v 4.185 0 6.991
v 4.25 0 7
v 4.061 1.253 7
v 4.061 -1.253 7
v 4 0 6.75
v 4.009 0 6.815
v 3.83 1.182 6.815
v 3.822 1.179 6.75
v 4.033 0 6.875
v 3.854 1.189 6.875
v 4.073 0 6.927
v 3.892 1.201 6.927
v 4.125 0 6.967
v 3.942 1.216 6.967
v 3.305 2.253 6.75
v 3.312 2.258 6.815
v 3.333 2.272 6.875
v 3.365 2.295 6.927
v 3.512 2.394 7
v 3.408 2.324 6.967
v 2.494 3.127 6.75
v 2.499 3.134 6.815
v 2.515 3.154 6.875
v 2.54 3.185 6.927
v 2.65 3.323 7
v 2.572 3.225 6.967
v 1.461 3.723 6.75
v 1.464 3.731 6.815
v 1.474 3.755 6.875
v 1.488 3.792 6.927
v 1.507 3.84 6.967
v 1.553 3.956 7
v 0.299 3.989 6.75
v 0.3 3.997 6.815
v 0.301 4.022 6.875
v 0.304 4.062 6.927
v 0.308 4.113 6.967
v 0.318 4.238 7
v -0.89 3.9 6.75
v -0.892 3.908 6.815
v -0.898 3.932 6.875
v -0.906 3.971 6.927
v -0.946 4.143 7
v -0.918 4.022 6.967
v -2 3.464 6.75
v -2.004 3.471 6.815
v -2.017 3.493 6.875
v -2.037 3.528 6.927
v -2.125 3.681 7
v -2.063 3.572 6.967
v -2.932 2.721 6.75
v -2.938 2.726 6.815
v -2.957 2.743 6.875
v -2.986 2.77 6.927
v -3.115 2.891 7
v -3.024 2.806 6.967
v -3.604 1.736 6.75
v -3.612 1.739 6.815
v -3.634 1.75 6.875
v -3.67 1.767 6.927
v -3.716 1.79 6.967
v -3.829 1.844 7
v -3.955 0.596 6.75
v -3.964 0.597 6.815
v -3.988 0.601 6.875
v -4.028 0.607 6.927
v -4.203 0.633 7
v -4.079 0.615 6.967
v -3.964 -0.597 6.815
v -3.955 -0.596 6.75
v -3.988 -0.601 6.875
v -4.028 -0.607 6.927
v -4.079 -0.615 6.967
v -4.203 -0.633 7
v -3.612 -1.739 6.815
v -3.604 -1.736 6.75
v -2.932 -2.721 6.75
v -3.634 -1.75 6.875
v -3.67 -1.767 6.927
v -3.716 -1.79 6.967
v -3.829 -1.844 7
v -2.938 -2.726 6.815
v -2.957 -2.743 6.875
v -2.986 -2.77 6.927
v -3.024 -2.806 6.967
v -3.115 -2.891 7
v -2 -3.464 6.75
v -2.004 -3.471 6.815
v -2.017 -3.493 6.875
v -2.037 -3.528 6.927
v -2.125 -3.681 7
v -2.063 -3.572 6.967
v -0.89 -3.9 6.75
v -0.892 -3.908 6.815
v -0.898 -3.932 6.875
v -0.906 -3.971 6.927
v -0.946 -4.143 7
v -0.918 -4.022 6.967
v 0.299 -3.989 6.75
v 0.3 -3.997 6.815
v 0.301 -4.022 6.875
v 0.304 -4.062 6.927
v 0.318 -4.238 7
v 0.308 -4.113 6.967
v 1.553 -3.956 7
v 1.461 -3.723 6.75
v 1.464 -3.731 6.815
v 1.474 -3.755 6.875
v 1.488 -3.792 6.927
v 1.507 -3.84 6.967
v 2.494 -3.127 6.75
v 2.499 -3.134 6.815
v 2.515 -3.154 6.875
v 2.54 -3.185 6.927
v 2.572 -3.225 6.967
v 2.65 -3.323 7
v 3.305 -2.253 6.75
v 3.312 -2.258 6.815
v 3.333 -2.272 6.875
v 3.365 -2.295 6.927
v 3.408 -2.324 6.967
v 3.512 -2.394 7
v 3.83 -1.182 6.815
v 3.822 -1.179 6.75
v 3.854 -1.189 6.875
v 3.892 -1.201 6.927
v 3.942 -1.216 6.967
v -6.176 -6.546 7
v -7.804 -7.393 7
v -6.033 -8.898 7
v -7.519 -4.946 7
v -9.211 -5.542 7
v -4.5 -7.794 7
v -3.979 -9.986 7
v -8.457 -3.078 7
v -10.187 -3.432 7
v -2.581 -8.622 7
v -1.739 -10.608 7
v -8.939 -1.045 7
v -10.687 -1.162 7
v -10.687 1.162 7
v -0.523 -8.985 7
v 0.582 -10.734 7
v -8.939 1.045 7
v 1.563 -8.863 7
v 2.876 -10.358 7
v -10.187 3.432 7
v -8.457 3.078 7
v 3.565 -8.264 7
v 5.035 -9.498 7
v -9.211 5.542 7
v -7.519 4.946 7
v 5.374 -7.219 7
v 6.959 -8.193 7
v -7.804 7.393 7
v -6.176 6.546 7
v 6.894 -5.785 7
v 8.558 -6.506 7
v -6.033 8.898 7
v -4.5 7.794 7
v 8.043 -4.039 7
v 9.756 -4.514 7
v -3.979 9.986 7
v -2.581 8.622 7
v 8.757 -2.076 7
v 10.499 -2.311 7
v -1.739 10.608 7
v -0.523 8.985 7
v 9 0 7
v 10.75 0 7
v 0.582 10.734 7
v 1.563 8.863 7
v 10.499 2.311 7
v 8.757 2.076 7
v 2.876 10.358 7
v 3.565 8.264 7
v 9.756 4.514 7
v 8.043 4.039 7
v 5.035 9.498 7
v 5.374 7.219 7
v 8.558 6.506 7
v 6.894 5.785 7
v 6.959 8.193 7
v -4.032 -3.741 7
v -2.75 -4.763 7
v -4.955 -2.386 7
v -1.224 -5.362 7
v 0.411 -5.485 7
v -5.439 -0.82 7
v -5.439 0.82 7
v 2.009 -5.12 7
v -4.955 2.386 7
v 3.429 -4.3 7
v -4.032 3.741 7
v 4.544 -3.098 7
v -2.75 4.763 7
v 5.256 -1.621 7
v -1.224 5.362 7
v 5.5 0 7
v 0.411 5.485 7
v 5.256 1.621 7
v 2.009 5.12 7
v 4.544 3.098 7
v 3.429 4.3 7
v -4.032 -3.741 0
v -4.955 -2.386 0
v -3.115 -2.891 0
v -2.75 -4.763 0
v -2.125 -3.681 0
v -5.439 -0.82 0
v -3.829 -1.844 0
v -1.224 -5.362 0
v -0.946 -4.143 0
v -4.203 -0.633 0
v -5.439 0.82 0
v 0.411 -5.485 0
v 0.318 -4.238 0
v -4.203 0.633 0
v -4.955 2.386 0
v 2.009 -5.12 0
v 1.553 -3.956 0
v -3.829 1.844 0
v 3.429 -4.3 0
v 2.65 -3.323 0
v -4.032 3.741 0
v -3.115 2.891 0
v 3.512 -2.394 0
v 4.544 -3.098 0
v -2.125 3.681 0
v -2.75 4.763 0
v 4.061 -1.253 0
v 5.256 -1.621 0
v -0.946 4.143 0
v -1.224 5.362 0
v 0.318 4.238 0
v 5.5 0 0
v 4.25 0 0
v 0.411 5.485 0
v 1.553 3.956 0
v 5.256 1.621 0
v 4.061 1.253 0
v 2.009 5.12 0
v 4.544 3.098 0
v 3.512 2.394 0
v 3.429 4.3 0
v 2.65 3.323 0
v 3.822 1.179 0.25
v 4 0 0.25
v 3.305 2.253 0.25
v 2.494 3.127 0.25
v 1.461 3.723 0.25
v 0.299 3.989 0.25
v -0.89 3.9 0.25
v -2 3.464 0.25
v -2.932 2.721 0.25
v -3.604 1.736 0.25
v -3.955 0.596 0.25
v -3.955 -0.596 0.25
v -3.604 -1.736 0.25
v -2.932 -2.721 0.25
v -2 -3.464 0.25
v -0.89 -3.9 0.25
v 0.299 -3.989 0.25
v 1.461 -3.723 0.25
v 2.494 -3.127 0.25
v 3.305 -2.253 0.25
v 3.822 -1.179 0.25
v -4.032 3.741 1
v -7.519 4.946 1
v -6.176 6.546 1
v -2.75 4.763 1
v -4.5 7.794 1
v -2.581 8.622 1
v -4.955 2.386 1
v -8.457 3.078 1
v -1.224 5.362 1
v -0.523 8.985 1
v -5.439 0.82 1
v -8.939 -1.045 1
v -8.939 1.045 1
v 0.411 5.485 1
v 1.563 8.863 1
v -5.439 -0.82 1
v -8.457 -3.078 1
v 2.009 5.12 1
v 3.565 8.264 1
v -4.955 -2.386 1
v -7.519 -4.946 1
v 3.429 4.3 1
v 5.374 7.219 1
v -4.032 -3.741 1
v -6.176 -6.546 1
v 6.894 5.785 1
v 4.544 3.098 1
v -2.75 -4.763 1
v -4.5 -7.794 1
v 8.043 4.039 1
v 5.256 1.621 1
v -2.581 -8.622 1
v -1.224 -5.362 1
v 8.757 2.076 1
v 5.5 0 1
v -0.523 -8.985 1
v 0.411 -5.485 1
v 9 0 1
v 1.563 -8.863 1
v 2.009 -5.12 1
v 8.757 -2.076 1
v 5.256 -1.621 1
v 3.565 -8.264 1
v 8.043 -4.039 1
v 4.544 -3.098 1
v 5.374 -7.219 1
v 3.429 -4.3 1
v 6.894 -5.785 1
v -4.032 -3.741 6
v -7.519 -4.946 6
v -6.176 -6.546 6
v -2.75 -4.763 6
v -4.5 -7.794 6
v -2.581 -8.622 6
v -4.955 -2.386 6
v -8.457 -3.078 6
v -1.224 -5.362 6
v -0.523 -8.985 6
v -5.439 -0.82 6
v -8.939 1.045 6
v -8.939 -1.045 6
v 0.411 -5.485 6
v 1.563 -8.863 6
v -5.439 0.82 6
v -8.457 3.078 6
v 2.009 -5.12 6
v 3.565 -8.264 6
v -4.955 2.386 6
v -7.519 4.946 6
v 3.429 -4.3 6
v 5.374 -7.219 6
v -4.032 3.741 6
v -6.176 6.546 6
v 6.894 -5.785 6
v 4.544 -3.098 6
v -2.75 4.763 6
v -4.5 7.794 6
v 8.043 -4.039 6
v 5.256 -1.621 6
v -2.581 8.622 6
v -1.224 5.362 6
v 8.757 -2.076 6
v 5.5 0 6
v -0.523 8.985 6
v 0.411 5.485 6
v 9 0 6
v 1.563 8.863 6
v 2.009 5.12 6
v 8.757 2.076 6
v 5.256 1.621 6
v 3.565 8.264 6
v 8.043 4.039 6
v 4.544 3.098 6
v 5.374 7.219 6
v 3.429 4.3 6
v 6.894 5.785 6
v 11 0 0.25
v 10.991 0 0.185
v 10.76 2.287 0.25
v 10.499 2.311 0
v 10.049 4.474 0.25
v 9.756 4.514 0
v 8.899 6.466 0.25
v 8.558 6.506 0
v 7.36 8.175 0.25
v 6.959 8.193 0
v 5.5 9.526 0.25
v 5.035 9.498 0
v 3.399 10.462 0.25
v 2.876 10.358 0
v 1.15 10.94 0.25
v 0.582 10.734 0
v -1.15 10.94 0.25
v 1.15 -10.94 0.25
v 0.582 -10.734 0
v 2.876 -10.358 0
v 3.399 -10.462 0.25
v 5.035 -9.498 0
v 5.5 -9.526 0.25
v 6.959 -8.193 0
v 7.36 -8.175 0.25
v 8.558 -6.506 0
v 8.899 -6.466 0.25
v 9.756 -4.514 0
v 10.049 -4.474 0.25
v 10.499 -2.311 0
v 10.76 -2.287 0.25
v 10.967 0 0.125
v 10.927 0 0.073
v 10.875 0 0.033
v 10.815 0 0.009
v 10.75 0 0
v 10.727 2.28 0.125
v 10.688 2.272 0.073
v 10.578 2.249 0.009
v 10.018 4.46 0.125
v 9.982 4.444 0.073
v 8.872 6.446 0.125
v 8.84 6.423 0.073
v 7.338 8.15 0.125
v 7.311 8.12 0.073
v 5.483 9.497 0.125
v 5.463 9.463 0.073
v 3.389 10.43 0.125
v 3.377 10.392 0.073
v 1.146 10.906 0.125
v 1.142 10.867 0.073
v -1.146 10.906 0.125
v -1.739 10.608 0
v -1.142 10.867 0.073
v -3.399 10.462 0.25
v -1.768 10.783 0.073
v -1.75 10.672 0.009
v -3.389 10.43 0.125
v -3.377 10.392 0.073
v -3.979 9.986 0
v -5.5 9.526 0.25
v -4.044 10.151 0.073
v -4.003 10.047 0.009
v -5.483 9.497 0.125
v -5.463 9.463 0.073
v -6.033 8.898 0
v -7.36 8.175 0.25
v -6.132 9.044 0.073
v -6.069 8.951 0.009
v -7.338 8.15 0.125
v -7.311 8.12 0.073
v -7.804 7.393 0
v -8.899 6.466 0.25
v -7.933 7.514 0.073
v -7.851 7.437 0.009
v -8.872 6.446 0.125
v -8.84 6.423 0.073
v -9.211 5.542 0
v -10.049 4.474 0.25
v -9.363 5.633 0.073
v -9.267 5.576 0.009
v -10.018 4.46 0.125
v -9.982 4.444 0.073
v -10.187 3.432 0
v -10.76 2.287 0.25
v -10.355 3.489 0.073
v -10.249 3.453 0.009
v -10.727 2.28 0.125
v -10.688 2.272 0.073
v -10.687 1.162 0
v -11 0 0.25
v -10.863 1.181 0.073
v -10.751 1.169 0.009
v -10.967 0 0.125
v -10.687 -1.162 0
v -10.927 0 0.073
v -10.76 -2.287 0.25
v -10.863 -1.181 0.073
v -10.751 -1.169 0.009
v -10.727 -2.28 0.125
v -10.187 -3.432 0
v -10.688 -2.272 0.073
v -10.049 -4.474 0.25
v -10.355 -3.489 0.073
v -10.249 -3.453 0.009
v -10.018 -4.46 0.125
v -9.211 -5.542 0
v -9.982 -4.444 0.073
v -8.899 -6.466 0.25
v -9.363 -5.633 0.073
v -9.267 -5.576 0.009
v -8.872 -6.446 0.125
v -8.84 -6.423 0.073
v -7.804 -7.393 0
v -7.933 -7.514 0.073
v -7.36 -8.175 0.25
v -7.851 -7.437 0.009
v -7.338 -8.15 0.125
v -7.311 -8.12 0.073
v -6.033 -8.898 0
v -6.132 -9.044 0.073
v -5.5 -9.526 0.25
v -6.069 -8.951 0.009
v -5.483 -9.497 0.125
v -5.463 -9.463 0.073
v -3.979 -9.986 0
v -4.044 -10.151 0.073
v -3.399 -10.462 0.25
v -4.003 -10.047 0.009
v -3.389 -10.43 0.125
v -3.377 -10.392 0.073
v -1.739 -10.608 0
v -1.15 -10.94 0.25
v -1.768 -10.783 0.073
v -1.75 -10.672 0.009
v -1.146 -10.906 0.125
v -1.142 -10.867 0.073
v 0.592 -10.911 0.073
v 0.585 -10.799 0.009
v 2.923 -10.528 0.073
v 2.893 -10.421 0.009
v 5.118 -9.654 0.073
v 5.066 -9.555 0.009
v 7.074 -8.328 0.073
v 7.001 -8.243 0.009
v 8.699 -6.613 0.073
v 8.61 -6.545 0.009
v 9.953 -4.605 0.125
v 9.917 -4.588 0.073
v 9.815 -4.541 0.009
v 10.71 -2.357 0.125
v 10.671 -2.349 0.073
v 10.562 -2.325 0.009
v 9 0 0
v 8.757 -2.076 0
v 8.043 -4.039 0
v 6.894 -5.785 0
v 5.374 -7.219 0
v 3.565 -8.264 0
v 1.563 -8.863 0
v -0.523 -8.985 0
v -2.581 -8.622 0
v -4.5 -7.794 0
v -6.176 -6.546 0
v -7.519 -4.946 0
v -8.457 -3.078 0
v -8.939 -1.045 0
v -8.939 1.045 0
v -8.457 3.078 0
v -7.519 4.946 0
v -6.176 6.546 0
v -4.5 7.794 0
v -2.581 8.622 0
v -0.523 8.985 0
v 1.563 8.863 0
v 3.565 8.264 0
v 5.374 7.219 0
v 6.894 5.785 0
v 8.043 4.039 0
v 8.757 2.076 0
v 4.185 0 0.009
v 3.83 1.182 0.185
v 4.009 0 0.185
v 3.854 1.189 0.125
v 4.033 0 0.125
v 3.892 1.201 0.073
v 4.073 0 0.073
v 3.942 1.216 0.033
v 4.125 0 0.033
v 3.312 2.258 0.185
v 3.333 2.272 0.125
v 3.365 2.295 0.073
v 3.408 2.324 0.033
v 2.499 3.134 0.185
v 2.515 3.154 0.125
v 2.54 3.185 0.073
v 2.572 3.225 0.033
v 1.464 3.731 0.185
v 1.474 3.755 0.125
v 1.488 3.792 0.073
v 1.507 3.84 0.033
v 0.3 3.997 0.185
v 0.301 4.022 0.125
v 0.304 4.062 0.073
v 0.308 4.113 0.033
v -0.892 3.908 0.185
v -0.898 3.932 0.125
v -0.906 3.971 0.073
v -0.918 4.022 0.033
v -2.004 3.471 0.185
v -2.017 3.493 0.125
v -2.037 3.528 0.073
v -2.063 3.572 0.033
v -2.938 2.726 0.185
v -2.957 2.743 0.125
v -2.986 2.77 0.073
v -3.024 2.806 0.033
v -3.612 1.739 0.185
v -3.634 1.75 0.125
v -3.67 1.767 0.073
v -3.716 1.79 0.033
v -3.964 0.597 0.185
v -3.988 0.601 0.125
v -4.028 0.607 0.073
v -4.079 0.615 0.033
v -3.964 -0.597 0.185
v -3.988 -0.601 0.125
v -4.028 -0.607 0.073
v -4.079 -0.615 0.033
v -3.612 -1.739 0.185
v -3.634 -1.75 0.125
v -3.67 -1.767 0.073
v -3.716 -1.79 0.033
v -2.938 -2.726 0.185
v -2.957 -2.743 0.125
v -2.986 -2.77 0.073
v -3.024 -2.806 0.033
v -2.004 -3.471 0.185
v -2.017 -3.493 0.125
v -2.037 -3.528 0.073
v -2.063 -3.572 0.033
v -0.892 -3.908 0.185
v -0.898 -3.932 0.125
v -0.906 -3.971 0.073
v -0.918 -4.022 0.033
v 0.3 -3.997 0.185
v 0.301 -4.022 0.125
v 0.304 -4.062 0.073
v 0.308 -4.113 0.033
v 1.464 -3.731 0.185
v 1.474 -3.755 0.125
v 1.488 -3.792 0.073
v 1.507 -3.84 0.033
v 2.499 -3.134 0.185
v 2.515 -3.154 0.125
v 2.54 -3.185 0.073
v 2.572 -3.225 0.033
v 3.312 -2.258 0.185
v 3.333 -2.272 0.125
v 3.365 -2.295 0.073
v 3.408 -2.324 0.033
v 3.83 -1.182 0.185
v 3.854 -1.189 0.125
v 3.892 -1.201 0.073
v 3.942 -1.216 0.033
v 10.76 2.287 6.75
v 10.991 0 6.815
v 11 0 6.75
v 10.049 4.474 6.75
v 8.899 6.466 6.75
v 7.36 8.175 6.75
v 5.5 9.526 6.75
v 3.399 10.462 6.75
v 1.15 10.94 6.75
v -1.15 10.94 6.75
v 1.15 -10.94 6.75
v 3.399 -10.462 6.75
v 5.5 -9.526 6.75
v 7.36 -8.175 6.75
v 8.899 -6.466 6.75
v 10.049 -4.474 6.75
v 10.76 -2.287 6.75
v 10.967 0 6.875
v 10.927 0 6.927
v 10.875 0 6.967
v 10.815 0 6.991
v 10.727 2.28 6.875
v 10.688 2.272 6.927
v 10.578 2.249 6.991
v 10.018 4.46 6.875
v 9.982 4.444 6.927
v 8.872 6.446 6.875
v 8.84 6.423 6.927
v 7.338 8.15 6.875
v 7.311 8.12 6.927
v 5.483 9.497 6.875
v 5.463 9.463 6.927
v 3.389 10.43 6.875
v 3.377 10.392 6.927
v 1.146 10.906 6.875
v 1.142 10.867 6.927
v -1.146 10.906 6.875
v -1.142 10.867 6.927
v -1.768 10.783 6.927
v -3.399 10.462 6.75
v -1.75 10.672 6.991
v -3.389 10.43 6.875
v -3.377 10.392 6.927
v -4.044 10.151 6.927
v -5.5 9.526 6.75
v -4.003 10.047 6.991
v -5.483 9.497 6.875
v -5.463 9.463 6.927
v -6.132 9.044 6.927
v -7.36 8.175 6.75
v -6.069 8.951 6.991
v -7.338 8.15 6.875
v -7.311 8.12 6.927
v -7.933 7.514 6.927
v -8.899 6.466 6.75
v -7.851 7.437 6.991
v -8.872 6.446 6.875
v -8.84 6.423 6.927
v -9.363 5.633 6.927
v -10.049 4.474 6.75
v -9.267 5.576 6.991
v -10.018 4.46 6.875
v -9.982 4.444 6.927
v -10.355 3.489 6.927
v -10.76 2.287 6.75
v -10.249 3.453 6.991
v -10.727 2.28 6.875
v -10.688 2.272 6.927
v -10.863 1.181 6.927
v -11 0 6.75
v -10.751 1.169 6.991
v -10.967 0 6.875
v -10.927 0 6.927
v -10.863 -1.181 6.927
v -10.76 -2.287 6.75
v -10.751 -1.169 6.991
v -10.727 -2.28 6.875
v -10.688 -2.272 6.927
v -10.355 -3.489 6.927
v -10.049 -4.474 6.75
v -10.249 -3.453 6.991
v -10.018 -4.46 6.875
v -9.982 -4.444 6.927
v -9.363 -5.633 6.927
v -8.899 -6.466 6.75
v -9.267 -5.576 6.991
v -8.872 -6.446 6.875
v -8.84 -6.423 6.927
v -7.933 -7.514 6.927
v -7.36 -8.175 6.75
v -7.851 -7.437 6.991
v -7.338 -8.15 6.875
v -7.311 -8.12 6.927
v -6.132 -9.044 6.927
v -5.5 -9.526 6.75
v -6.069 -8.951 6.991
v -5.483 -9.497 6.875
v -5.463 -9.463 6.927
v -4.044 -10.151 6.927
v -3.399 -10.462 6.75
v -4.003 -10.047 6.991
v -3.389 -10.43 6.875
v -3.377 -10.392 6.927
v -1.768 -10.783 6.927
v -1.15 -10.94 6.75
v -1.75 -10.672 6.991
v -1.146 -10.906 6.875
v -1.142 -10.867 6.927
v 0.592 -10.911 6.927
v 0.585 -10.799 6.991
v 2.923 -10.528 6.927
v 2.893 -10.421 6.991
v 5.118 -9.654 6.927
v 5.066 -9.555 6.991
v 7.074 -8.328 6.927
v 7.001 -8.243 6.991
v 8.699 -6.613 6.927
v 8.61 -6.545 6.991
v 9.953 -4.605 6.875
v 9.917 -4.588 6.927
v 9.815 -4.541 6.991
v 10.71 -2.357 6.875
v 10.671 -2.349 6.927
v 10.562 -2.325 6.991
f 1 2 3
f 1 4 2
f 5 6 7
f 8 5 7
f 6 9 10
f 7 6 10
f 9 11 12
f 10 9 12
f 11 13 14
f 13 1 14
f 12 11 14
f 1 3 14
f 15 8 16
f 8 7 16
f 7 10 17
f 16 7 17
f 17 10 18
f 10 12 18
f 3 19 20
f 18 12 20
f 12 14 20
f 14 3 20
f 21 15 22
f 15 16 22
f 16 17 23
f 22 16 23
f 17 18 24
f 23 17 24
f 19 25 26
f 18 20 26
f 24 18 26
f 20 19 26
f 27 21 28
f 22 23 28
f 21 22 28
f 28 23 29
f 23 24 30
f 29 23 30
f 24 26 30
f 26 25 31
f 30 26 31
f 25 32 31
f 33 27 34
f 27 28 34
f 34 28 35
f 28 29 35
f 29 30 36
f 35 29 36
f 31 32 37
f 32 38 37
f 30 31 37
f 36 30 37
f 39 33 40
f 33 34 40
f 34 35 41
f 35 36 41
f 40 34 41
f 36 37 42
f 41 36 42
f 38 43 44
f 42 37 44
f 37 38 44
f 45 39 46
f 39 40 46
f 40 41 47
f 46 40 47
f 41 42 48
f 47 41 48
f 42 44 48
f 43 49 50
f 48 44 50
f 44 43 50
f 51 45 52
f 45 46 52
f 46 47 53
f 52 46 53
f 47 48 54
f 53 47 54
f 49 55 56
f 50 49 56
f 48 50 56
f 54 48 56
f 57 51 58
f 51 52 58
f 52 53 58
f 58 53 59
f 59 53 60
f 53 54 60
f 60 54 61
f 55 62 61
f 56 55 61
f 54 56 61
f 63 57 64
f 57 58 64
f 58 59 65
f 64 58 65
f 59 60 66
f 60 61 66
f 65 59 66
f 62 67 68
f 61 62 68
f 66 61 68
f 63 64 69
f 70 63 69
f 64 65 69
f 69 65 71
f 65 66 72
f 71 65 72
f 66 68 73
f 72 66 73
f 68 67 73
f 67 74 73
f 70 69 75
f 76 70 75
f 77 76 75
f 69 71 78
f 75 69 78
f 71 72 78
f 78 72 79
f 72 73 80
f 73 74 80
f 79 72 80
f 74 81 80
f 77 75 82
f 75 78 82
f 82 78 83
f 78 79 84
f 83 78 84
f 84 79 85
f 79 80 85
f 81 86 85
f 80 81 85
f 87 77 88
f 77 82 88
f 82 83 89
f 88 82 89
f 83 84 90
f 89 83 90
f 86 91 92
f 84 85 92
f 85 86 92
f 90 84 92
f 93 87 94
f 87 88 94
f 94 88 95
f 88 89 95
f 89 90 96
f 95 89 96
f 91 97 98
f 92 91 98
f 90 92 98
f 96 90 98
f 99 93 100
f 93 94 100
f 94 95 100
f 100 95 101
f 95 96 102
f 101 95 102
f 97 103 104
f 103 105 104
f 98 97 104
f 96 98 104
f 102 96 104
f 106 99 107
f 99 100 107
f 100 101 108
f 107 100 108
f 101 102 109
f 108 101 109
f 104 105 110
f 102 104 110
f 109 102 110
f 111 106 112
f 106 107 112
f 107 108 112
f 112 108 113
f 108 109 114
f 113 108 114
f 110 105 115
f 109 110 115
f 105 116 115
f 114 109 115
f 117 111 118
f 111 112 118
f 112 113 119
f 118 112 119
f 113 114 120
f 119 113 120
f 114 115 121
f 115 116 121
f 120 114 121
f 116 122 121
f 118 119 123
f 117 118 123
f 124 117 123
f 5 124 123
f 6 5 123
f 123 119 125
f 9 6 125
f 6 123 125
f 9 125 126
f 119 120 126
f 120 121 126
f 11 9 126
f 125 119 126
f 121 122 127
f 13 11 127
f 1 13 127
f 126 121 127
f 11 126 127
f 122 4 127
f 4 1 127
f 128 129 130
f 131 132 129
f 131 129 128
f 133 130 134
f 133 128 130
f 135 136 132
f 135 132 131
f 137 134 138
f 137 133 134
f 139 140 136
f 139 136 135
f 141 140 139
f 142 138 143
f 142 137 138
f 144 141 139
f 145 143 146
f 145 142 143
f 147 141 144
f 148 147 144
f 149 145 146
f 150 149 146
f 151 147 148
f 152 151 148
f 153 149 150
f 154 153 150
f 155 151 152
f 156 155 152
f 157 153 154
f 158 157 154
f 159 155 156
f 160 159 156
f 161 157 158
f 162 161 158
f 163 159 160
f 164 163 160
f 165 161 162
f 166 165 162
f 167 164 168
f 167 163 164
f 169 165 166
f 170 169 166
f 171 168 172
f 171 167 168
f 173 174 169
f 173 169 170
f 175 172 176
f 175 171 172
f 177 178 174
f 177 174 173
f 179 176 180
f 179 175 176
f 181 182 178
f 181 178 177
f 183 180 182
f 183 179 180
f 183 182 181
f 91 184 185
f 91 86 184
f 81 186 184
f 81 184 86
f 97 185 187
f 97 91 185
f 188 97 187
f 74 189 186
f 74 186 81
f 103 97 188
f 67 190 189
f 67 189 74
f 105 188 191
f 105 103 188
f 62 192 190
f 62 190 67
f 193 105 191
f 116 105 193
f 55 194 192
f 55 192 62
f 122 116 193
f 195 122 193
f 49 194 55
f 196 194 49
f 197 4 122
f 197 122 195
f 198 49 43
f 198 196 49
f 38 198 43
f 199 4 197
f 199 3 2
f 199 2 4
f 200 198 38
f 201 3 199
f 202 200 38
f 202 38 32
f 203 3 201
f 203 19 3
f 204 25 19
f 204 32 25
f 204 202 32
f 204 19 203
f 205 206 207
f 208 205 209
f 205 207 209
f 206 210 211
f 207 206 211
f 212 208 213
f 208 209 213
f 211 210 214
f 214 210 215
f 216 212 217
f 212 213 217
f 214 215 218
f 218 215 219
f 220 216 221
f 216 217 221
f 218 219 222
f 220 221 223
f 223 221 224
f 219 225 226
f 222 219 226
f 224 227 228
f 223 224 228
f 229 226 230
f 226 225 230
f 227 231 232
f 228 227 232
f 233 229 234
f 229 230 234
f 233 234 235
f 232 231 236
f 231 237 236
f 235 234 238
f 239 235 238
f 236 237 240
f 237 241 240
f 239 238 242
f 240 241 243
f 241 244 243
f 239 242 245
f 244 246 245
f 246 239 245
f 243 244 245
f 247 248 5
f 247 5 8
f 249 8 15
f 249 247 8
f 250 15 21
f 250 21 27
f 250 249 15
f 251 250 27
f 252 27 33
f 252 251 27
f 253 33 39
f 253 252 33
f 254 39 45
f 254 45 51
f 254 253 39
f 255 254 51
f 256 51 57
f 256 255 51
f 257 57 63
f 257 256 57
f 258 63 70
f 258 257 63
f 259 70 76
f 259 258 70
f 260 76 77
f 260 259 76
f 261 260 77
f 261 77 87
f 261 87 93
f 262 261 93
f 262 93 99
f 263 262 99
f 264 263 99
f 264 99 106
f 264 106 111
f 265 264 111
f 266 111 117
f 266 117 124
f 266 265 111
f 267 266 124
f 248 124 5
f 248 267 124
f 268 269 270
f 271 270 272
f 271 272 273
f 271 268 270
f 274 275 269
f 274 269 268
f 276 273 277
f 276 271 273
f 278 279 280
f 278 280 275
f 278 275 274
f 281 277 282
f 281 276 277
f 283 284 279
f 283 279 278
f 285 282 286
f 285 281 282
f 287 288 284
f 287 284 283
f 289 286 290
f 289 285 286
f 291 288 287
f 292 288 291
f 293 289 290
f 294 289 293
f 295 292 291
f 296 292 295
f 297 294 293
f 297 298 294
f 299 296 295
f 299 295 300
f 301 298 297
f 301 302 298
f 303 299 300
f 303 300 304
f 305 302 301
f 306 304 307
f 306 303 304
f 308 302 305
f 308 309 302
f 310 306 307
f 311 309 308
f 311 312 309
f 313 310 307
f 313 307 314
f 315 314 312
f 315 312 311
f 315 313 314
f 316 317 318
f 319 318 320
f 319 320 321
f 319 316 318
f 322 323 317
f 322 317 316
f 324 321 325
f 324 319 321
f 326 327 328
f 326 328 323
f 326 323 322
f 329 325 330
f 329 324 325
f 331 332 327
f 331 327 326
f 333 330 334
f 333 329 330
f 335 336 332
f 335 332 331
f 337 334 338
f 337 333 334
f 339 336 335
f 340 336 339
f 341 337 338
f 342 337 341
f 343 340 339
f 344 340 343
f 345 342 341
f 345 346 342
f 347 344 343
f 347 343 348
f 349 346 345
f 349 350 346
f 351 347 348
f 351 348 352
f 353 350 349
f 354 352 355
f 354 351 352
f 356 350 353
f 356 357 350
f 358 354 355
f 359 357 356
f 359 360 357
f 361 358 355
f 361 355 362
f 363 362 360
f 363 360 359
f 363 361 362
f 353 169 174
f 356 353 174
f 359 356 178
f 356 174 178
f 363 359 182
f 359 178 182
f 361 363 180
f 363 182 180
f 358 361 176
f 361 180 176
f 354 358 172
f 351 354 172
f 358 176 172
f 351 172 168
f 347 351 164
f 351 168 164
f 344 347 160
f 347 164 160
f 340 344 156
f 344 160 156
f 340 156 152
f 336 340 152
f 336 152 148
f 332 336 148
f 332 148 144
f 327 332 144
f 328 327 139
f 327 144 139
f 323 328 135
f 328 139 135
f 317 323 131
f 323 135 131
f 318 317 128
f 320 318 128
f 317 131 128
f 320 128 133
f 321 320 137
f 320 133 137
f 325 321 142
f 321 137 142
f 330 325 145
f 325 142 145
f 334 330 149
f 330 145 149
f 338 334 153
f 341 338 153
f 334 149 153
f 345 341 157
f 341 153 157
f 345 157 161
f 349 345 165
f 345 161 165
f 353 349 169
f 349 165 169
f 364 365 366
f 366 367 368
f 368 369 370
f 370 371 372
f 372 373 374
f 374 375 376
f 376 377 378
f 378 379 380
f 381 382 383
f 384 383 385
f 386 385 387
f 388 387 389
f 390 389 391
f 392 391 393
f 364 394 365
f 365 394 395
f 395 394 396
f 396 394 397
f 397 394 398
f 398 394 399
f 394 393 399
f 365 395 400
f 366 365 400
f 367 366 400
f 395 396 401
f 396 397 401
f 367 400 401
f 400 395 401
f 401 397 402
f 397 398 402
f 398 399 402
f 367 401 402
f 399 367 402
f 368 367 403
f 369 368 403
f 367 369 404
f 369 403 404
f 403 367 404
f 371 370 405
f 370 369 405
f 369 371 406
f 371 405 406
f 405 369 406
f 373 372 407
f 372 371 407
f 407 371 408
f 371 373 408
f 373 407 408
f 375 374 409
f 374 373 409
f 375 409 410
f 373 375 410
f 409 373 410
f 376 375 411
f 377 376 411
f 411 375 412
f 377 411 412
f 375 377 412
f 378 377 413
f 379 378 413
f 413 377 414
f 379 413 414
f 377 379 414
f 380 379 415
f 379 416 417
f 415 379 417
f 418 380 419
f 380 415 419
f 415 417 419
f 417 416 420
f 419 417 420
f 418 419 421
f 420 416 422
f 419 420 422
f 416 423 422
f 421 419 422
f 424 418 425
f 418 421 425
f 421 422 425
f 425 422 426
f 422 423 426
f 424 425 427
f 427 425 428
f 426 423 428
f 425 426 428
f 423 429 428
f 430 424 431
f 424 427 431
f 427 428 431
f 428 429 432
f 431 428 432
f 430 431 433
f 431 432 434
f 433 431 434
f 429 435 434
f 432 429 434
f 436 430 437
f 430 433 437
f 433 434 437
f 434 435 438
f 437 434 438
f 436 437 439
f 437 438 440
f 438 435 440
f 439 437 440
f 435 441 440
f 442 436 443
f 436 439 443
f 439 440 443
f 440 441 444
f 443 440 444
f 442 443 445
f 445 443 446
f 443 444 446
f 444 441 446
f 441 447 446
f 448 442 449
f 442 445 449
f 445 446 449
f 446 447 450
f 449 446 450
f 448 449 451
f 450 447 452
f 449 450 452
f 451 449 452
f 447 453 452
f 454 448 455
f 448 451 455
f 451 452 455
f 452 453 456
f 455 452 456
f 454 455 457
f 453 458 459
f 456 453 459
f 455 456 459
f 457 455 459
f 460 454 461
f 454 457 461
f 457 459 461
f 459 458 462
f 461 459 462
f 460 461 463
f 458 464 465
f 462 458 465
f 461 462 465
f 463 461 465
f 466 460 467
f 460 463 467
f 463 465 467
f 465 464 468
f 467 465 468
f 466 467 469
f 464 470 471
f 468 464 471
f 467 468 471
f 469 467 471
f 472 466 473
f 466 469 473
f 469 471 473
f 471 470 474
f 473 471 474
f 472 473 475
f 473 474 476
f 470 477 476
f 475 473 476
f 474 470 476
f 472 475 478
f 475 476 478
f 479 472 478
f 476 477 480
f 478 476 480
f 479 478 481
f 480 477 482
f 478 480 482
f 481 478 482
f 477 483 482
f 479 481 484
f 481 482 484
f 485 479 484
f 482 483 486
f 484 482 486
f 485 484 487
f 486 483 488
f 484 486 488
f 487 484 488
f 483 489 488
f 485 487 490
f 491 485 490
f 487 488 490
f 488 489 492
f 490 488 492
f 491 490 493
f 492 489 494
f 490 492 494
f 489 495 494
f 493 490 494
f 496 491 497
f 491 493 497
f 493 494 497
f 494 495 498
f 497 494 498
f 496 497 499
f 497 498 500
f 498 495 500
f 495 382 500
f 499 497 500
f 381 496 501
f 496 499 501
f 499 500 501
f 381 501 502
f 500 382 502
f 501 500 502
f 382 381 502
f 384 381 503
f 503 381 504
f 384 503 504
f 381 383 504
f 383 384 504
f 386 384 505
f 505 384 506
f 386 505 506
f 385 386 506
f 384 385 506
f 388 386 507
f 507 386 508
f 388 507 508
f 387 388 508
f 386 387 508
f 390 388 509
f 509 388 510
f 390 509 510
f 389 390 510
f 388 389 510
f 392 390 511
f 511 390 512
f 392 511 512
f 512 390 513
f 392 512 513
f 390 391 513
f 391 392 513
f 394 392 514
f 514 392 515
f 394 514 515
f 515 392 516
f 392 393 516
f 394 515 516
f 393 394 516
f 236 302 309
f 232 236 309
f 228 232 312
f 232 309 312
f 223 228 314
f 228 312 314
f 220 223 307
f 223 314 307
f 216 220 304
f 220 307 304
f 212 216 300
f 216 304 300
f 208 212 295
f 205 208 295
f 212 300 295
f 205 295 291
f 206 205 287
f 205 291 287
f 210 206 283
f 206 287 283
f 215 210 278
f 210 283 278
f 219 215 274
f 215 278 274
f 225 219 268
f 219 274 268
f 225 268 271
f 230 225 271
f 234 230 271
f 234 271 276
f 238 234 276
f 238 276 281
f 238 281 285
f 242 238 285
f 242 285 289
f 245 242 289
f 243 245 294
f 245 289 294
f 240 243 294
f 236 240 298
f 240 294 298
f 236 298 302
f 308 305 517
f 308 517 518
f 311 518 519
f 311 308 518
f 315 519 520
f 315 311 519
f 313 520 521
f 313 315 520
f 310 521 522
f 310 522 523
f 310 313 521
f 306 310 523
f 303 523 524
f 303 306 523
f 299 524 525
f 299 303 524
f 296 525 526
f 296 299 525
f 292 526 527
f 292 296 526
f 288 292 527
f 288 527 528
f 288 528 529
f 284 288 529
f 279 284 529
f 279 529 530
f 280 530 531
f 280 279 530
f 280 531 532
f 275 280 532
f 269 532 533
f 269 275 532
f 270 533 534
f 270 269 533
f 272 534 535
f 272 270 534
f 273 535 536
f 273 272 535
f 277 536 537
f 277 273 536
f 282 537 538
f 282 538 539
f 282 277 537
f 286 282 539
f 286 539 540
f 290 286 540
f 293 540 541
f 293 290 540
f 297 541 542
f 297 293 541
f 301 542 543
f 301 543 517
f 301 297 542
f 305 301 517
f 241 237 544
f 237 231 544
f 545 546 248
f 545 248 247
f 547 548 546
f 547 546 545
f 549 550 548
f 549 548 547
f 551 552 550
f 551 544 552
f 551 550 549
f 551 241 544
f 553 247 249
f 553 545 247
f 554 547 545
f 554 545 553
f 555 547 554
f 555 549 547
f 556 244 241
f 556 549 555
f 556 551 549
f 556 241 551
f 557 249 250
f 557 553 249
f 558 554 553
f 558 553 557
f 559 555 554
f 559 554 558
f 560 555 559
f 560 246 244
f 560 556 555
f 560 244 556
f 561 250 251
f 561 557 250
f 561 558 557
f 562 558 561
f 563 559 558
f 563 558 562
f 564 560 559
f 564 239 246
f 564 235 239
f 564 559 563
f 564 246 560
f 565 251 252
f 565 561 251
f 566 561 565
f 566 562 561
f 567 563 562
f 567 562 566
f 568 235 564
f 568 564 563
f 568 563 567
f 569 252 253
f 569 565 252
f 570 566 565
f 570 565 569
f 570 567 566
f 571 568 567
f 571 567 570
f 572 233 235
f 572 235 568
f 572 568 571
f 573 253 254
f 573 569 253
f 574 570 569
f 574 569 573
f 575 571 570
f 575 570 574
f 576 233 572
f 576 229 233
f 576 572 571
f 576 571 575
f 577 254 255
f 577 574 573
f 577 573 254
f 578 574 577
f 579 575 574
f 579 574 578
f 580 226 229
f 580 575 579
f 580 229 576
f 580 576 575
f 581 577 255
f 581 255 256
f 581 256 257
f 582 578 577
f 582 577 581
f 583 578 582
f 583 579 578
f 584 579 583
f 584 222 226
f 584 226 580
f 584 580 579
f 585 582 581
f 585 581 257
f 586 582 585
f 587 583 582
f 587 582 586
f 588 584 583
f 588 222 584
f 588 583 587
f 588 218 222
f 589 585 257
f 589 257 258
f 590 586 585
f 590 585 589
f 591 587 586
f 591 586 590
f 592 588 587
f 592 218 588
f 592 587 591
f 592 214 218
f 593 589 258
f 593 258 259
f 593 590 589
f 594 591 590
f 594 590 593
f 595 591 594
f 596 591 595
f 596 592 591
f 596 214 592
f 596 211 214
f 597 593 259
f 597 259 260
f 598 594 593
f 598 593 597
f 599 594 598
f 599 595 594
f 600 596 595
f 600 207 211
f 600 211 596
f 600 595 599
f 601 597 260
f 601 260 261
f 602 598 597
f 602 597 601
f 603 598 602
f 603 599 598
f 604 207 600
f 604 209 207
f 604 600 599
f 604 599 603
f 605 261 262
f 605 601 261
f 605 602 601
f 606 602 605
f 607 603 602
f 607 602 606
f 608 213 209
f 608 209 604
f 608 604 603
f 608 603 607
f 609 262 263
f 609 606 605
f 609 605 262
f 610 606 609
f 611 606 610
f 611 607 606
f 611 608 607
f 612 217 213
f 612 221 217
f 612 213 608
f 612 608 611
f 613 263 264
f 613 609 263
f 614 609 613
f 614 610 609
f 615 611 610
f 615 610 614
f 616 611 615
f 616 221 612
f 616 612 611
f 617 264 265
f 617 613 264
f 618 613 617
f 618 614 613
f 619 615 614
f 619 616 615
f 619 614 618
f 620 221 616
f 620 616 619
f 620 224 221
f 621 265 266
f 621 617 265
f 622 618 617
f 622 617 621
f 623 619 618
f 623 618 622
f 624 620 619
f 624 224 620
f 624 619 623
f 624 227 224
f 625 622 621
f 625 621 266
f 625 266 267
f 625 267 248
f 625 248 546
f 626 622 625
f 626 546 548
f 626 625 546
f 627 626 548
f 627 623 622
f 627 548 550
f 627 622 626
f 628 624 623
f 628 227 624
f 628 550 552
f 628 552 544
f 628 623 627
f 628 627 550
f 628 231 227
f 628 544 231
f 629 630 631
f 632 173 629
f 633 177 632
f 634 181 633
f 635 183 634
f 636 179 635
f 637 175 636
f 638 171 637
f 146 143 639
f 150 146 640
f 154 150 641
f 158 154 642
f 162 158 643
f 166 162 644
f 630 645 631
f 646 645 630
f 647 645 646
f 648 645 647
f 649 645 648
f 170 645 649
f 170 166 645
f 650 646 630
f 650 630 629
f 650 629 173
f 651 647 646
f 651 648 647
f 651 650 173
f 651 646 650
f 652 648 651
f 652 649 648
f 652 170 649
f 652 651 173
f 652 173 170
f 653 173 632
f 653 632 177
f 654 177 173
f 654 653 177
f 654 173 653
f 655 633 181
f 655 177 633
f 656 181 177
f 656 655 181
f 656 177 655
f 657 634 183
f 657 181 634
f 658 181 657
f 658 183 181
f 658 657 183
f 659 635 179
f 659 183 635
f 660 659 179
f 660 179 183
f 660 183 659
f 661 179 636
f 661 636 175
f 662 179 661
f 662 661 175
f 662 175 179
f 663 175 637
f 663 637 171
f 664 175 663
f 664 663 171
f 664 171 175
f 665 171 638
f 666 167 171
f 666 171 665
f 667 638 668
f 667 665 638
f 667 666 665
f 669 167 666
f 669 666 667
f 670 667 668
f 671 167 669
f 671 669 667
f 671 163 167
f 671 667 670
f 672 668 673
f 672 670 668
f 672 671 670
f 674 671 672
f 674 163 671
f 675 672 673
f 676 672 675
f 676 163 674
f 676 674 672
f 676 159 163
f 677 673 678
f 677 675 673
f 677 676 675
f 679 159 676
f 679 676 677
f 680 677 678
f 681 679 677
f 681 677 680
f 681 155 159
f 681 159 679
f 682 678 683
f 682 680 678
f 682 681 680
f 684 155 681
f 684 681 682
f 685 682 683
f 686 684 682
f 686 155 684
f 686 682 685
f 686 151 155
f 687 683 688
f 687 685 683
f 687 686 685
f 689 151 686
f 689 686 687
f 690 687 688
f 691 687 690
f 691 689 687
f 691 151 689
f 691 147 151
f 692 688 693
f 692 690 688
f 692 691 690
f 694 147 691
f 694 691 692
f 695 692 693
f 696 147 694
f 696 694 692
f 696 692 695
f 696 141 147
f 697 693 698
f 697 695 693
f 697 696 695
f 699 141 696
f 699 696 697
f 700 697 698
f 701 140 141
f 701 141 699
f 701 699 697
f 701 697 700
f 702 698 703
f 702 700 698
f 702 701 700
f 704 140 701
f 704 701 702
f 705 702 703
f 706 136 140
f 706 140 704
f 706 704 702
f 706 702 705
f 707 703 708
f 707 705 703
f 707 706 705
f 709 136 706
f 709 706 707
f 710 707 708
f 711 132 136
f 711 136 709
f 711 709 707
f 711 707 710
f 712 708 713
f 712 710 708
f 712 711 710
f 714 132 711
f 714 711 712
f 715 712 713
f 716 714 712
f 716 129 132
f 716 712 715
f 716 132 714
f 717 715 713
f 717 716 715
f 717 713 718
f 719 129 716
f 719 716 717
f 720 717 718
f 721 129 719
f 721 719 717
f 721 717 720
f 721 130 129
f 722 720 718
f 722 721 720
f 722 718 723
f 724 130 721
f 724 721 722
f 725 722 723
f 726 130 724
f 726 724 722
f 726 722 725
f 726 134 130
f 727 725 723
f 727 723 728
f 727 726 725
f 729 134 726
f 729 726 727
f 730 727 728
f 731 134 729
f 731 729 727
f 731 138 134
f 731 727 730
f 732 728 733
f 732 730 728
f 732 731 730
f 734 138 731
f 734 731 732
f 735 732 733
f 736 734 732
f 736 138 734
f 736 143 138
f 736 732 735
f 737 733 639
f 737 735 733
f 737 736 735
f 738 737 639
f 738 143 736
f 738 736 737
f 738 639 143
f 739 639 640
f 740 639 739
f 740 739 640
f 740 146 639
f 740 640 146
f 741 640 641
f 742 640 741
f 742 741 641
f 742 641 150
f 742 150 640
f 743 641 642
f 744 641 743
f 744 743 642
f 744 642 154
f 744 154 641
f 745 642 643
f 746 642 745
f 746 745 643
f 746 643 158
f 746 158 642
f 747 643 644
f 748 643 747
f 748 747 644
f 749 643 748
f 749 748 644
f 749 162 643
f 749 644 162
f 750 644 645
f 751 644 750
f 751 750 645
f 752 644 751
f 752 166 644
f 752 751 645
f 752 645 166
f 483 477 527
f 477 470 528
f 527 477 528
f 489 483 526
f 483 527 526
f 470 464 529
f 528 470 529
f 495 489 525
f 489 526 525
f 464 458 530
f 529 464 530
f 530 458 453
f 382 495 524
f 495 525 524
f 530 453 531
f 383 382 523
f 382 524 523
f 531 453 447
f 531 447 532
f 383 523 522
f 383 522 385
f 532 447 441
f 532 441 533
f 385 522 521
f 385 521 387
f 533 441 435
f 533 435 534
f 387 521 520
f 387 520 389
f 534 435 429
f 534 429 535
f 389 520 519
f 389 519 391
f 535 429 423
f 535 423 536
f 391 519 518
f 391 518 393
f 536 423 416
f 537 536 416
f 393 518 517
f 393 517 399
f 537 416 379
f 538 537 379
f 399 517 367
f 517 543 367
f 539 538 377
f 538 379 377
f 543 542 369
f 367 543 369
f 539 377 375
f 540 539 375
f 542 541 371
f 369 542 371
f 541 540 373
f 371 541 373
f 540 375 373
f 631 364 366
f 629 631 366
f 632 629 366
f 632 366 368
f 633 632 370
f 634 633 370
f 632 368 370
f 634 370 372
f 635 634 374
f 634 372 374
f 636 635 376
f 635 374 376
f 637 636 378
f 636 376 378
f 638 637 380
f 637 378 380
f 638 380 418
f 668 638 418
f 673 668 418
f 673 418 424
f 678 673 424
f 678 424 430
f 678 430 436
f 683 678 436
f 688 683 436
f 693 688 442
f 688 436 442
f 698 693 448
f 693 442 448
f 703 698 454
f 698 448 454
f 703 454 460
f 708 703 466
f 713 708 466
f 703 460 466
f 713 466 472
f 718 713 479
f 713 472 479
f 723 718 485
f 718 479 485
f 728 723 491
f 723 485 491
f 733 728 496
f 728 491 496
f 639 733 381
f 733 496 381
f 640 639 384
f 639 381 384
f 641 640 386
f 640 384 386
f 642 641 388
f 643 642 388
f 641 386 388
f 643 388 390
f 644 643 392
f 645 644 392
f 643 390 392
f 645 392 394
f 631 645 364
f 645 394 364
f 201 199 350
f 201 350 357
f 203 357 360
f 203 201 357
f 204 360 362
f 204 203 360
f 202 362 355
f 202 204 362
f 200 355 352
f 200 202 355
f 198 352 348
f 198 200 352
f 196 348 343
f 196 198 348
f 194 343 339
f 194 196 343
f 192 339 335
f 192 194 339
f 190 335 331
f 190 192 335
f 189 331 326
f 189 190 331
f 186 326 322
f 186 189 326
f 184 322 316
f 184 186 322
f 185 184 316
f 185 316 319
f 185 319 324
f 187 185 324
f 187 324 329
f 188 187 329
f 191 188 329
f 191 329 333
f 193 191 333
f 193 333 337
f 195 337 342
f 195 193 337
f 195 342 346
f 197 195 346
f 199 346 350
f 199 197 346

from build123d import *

# Parameters (mm, degrees)
ESQUISSE1_R      = 11
ESQUISSE1_R_2    = 4
EXTRUSION1_DEPTH = 7
CONG_1_R         = 0.25
ESQUISSE2_R      = 9
ESQUISSE2_R_2    = 5.5
EXTRUSION2_DEPTH = 1
EXTRUSION3_START = -1
ESQUISSE3_R      = 9
ESQUISSE3_R_2    = 5.5
EXTRUSION3_DEPTH = 1


with BuildPart() as part:
    # Esquisse1 → Extrusion1 (new body)
    with BuildSketch(Plane.XY):
        Circle(ESQUISSE1_R)
        Circle(ESQUISSE1_R_2, mode=Mode.SUBTRACT)
    extrude(amount=EXTRUSION1_DEPTH)

    # Congé1
    cong_1_edges = [part.edges().sort_by_distance(p)[0] for p in [
        (-11, 0, 0),
        (-11, 0, 7),
        (-4, 0, 0),
        (-4, 0, 7),
    ]]
    fillet(cong_1_edges, radius=CONG_1_R)

    # Esquisse2 → Extrusion2 (cut)
    with BuildSketch(Plane.XY.offset(7)):
        Circle(ESQUISSE2_R)
        Circle(ESQUISSE2_R_2, mode=Mode.SUBTRACT)
    extrude(amount=-EXTRUSION2_DEPTH, mode=Mode.SUBTRACT)

    # Esquisse3 → Extrusion3 (cut)
    with BuildSketch(Plane(origin=(0, 0, 0), x_dir=(-1, 0, 0), z_dir=(0, 0, -1)).offset(EXTRUSION3_START)):
        with Locations(Location((0, 0, 0), (0, 0, 180))):
            Circle(ESQUISSE3_R)
        with Locations(Location((0, 0, 0), (0, 0, 180))):
            Circle(ESQUISSE3_R_2, mode=Mode.SUBTRACT)
    extrude(amount=EXTRUSION3_DEPTH, mode=Mode.SUBTRACT)


solid = part.part
